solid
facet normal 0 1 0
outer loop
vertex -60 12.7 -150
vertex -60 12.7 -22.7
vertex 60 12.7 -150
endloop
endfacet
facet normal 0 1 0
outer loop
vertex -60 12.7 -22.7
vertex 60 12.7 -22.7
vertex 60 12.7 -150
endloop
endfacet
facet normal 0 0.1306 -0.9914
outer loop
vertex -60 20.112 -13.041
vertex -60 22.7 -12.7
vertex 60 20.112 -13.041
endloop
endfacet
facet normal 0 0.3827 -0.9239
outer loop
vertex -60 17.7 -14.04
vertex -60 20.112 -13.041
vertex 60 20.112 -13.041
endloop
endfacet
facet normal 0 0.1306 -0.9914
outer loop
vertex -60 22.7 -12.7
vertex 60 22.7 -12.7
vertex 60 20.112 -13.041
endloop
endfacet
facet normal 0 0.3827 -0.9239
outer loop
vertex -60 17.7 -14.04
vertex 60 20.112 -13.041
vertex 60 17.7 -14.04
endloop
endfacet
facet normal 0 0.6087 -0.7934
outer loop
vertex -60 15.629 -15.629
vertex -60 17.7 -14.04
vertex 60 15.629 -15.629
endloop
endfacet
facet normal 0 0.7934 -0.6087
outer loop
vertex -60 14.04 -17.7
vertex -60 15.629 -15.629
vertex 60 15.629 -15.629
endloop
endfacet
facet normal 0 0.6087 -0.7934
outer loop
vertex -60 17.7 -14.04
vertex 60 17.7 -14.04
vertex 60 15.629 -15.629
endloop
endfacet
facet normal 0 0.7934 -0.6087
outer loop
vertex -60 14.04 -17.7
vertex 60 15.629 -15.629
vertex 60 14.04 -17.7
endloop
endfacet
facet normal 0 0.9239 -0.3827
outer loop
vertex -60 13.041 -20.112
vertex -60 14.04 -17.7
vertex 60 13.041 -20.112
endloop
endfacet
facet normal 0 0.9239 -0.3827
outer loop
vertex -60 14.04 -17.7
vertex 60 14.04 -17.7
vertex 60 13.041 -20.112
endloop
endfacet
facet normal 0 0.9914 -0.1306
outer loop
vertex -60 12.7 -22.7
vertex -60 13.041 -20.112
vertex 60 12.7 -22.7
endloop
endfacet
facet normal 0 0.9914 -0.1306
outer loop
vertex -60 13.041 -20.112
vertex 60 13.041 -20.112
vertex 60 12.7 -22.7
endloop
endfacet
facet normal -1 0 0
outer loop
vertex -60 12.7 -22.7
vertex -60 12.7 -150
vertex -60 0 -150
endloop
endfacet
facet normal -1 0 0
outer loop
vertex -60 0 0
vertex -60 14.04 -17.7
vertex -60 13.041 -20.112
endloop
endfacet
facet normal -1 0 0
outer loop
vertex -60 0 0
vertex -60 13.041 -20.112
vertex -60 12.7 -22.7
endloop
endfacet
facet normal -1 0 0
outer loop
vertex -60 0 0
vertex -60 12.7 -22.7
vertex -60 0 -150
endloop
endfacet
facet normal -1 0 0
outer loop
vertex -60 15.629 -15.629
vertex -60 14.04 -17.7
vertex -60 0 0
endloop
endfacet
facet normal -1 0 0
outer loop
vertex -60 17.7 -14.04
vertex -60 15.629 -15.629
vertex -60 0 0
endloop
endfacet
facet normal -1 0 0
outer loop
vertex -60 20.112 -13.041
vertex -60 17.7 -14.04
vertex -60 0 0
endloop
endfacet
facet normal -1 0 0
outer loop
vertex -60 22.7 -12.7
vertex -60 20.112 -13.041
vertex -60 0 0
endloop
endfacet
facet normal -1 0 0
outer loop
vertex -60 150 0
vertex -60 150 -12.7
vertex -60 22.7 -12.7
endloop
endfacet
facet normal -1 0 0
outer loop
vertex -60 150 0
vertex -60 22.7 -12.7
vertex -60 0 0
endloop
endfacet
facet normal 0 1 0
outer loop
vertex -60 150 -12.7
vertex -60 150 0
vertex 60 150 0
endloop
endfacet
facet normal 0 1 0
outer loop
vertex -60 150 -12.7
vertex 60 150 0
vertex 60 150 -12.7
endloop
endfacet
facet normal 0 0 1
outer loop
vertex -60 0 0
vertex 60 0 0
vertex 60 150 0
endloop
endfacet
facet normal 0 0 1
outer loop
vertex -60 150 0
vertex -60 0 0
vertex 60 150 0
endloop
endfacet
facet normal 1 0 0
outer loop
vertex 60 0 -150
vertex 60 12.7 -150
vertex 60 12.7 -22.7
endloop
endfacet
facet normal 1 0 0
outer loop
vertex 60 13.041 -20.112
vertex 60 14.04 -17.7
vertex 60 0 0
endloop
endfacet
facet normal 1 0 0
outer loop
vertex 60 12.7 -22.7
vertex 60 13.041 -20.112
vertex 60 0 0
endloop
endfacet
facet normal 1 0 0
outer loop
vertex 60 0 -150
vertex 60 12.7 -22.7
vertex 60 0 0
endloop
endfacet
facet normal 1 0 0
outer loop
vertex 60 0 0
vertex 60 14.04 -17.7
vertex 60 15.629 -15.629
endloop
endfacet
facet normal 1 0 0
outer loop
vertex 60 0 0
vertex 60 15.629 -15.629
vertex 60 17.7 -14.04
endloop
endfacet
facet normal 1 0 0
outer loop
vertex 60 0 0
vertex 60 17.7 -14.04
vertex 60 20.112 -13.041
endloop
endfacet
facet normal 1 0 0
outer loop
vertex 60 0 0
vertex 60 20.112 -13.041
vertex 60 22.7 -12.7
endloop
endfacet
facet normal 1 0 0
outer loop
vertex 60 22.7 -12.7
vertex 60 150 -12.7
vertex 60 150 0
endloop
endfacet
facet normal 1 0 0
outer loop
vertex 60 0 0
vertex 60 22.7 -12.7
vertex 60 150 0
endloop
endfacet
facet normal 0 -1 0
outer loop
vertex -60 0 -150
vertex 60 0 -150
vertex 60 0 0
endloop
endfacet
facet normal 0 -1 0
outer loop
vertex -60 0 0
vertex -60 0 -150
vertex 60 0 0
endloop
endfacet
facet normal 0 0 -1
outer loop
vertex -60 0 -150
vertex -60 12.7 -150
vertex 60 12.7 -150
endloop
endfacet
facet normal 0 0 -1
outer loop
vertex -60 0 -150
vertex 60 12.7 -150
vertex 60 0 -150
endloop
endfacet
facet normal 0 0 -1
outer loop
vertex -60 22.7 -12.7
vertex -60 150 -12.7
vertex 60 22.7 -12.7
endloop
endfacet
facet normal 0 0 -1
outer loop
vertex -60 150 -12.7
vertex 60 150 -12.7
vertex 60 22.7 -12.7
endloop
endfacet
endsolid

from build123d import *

# Parameters (mm, degrees)
SALIENTE_EXTRUIR1_DEPTH = 60


with BuildPart() as part:
    # Croquis1 → Saliente-Extruir1 (new, symmetric)
    with BuildSketch(Plane(origin=(0, 0, 0), x_dir=(0, 0, -1), z_dir=(1, 0, 0))):
        with BuildLine():
            Line((0, 0), (0, 150))
            Line((0, 150), (12.7, 150))
            Line((12.7, 150), (12.7, 22.7))
            ThreePointArc((12.7, 22.7), (15.628932188, 15.628932188), (22.7, 12.7))
            Line((22.7, 12.7), (150, 12.7))
            Line((150, 12.7), (150, 0))
            Line((150, 0), (0, 0))
        make_face()
    extrude(amount=SALIENTE_EXTRUIR1_DEPTH, both=True)


solid = part.part
